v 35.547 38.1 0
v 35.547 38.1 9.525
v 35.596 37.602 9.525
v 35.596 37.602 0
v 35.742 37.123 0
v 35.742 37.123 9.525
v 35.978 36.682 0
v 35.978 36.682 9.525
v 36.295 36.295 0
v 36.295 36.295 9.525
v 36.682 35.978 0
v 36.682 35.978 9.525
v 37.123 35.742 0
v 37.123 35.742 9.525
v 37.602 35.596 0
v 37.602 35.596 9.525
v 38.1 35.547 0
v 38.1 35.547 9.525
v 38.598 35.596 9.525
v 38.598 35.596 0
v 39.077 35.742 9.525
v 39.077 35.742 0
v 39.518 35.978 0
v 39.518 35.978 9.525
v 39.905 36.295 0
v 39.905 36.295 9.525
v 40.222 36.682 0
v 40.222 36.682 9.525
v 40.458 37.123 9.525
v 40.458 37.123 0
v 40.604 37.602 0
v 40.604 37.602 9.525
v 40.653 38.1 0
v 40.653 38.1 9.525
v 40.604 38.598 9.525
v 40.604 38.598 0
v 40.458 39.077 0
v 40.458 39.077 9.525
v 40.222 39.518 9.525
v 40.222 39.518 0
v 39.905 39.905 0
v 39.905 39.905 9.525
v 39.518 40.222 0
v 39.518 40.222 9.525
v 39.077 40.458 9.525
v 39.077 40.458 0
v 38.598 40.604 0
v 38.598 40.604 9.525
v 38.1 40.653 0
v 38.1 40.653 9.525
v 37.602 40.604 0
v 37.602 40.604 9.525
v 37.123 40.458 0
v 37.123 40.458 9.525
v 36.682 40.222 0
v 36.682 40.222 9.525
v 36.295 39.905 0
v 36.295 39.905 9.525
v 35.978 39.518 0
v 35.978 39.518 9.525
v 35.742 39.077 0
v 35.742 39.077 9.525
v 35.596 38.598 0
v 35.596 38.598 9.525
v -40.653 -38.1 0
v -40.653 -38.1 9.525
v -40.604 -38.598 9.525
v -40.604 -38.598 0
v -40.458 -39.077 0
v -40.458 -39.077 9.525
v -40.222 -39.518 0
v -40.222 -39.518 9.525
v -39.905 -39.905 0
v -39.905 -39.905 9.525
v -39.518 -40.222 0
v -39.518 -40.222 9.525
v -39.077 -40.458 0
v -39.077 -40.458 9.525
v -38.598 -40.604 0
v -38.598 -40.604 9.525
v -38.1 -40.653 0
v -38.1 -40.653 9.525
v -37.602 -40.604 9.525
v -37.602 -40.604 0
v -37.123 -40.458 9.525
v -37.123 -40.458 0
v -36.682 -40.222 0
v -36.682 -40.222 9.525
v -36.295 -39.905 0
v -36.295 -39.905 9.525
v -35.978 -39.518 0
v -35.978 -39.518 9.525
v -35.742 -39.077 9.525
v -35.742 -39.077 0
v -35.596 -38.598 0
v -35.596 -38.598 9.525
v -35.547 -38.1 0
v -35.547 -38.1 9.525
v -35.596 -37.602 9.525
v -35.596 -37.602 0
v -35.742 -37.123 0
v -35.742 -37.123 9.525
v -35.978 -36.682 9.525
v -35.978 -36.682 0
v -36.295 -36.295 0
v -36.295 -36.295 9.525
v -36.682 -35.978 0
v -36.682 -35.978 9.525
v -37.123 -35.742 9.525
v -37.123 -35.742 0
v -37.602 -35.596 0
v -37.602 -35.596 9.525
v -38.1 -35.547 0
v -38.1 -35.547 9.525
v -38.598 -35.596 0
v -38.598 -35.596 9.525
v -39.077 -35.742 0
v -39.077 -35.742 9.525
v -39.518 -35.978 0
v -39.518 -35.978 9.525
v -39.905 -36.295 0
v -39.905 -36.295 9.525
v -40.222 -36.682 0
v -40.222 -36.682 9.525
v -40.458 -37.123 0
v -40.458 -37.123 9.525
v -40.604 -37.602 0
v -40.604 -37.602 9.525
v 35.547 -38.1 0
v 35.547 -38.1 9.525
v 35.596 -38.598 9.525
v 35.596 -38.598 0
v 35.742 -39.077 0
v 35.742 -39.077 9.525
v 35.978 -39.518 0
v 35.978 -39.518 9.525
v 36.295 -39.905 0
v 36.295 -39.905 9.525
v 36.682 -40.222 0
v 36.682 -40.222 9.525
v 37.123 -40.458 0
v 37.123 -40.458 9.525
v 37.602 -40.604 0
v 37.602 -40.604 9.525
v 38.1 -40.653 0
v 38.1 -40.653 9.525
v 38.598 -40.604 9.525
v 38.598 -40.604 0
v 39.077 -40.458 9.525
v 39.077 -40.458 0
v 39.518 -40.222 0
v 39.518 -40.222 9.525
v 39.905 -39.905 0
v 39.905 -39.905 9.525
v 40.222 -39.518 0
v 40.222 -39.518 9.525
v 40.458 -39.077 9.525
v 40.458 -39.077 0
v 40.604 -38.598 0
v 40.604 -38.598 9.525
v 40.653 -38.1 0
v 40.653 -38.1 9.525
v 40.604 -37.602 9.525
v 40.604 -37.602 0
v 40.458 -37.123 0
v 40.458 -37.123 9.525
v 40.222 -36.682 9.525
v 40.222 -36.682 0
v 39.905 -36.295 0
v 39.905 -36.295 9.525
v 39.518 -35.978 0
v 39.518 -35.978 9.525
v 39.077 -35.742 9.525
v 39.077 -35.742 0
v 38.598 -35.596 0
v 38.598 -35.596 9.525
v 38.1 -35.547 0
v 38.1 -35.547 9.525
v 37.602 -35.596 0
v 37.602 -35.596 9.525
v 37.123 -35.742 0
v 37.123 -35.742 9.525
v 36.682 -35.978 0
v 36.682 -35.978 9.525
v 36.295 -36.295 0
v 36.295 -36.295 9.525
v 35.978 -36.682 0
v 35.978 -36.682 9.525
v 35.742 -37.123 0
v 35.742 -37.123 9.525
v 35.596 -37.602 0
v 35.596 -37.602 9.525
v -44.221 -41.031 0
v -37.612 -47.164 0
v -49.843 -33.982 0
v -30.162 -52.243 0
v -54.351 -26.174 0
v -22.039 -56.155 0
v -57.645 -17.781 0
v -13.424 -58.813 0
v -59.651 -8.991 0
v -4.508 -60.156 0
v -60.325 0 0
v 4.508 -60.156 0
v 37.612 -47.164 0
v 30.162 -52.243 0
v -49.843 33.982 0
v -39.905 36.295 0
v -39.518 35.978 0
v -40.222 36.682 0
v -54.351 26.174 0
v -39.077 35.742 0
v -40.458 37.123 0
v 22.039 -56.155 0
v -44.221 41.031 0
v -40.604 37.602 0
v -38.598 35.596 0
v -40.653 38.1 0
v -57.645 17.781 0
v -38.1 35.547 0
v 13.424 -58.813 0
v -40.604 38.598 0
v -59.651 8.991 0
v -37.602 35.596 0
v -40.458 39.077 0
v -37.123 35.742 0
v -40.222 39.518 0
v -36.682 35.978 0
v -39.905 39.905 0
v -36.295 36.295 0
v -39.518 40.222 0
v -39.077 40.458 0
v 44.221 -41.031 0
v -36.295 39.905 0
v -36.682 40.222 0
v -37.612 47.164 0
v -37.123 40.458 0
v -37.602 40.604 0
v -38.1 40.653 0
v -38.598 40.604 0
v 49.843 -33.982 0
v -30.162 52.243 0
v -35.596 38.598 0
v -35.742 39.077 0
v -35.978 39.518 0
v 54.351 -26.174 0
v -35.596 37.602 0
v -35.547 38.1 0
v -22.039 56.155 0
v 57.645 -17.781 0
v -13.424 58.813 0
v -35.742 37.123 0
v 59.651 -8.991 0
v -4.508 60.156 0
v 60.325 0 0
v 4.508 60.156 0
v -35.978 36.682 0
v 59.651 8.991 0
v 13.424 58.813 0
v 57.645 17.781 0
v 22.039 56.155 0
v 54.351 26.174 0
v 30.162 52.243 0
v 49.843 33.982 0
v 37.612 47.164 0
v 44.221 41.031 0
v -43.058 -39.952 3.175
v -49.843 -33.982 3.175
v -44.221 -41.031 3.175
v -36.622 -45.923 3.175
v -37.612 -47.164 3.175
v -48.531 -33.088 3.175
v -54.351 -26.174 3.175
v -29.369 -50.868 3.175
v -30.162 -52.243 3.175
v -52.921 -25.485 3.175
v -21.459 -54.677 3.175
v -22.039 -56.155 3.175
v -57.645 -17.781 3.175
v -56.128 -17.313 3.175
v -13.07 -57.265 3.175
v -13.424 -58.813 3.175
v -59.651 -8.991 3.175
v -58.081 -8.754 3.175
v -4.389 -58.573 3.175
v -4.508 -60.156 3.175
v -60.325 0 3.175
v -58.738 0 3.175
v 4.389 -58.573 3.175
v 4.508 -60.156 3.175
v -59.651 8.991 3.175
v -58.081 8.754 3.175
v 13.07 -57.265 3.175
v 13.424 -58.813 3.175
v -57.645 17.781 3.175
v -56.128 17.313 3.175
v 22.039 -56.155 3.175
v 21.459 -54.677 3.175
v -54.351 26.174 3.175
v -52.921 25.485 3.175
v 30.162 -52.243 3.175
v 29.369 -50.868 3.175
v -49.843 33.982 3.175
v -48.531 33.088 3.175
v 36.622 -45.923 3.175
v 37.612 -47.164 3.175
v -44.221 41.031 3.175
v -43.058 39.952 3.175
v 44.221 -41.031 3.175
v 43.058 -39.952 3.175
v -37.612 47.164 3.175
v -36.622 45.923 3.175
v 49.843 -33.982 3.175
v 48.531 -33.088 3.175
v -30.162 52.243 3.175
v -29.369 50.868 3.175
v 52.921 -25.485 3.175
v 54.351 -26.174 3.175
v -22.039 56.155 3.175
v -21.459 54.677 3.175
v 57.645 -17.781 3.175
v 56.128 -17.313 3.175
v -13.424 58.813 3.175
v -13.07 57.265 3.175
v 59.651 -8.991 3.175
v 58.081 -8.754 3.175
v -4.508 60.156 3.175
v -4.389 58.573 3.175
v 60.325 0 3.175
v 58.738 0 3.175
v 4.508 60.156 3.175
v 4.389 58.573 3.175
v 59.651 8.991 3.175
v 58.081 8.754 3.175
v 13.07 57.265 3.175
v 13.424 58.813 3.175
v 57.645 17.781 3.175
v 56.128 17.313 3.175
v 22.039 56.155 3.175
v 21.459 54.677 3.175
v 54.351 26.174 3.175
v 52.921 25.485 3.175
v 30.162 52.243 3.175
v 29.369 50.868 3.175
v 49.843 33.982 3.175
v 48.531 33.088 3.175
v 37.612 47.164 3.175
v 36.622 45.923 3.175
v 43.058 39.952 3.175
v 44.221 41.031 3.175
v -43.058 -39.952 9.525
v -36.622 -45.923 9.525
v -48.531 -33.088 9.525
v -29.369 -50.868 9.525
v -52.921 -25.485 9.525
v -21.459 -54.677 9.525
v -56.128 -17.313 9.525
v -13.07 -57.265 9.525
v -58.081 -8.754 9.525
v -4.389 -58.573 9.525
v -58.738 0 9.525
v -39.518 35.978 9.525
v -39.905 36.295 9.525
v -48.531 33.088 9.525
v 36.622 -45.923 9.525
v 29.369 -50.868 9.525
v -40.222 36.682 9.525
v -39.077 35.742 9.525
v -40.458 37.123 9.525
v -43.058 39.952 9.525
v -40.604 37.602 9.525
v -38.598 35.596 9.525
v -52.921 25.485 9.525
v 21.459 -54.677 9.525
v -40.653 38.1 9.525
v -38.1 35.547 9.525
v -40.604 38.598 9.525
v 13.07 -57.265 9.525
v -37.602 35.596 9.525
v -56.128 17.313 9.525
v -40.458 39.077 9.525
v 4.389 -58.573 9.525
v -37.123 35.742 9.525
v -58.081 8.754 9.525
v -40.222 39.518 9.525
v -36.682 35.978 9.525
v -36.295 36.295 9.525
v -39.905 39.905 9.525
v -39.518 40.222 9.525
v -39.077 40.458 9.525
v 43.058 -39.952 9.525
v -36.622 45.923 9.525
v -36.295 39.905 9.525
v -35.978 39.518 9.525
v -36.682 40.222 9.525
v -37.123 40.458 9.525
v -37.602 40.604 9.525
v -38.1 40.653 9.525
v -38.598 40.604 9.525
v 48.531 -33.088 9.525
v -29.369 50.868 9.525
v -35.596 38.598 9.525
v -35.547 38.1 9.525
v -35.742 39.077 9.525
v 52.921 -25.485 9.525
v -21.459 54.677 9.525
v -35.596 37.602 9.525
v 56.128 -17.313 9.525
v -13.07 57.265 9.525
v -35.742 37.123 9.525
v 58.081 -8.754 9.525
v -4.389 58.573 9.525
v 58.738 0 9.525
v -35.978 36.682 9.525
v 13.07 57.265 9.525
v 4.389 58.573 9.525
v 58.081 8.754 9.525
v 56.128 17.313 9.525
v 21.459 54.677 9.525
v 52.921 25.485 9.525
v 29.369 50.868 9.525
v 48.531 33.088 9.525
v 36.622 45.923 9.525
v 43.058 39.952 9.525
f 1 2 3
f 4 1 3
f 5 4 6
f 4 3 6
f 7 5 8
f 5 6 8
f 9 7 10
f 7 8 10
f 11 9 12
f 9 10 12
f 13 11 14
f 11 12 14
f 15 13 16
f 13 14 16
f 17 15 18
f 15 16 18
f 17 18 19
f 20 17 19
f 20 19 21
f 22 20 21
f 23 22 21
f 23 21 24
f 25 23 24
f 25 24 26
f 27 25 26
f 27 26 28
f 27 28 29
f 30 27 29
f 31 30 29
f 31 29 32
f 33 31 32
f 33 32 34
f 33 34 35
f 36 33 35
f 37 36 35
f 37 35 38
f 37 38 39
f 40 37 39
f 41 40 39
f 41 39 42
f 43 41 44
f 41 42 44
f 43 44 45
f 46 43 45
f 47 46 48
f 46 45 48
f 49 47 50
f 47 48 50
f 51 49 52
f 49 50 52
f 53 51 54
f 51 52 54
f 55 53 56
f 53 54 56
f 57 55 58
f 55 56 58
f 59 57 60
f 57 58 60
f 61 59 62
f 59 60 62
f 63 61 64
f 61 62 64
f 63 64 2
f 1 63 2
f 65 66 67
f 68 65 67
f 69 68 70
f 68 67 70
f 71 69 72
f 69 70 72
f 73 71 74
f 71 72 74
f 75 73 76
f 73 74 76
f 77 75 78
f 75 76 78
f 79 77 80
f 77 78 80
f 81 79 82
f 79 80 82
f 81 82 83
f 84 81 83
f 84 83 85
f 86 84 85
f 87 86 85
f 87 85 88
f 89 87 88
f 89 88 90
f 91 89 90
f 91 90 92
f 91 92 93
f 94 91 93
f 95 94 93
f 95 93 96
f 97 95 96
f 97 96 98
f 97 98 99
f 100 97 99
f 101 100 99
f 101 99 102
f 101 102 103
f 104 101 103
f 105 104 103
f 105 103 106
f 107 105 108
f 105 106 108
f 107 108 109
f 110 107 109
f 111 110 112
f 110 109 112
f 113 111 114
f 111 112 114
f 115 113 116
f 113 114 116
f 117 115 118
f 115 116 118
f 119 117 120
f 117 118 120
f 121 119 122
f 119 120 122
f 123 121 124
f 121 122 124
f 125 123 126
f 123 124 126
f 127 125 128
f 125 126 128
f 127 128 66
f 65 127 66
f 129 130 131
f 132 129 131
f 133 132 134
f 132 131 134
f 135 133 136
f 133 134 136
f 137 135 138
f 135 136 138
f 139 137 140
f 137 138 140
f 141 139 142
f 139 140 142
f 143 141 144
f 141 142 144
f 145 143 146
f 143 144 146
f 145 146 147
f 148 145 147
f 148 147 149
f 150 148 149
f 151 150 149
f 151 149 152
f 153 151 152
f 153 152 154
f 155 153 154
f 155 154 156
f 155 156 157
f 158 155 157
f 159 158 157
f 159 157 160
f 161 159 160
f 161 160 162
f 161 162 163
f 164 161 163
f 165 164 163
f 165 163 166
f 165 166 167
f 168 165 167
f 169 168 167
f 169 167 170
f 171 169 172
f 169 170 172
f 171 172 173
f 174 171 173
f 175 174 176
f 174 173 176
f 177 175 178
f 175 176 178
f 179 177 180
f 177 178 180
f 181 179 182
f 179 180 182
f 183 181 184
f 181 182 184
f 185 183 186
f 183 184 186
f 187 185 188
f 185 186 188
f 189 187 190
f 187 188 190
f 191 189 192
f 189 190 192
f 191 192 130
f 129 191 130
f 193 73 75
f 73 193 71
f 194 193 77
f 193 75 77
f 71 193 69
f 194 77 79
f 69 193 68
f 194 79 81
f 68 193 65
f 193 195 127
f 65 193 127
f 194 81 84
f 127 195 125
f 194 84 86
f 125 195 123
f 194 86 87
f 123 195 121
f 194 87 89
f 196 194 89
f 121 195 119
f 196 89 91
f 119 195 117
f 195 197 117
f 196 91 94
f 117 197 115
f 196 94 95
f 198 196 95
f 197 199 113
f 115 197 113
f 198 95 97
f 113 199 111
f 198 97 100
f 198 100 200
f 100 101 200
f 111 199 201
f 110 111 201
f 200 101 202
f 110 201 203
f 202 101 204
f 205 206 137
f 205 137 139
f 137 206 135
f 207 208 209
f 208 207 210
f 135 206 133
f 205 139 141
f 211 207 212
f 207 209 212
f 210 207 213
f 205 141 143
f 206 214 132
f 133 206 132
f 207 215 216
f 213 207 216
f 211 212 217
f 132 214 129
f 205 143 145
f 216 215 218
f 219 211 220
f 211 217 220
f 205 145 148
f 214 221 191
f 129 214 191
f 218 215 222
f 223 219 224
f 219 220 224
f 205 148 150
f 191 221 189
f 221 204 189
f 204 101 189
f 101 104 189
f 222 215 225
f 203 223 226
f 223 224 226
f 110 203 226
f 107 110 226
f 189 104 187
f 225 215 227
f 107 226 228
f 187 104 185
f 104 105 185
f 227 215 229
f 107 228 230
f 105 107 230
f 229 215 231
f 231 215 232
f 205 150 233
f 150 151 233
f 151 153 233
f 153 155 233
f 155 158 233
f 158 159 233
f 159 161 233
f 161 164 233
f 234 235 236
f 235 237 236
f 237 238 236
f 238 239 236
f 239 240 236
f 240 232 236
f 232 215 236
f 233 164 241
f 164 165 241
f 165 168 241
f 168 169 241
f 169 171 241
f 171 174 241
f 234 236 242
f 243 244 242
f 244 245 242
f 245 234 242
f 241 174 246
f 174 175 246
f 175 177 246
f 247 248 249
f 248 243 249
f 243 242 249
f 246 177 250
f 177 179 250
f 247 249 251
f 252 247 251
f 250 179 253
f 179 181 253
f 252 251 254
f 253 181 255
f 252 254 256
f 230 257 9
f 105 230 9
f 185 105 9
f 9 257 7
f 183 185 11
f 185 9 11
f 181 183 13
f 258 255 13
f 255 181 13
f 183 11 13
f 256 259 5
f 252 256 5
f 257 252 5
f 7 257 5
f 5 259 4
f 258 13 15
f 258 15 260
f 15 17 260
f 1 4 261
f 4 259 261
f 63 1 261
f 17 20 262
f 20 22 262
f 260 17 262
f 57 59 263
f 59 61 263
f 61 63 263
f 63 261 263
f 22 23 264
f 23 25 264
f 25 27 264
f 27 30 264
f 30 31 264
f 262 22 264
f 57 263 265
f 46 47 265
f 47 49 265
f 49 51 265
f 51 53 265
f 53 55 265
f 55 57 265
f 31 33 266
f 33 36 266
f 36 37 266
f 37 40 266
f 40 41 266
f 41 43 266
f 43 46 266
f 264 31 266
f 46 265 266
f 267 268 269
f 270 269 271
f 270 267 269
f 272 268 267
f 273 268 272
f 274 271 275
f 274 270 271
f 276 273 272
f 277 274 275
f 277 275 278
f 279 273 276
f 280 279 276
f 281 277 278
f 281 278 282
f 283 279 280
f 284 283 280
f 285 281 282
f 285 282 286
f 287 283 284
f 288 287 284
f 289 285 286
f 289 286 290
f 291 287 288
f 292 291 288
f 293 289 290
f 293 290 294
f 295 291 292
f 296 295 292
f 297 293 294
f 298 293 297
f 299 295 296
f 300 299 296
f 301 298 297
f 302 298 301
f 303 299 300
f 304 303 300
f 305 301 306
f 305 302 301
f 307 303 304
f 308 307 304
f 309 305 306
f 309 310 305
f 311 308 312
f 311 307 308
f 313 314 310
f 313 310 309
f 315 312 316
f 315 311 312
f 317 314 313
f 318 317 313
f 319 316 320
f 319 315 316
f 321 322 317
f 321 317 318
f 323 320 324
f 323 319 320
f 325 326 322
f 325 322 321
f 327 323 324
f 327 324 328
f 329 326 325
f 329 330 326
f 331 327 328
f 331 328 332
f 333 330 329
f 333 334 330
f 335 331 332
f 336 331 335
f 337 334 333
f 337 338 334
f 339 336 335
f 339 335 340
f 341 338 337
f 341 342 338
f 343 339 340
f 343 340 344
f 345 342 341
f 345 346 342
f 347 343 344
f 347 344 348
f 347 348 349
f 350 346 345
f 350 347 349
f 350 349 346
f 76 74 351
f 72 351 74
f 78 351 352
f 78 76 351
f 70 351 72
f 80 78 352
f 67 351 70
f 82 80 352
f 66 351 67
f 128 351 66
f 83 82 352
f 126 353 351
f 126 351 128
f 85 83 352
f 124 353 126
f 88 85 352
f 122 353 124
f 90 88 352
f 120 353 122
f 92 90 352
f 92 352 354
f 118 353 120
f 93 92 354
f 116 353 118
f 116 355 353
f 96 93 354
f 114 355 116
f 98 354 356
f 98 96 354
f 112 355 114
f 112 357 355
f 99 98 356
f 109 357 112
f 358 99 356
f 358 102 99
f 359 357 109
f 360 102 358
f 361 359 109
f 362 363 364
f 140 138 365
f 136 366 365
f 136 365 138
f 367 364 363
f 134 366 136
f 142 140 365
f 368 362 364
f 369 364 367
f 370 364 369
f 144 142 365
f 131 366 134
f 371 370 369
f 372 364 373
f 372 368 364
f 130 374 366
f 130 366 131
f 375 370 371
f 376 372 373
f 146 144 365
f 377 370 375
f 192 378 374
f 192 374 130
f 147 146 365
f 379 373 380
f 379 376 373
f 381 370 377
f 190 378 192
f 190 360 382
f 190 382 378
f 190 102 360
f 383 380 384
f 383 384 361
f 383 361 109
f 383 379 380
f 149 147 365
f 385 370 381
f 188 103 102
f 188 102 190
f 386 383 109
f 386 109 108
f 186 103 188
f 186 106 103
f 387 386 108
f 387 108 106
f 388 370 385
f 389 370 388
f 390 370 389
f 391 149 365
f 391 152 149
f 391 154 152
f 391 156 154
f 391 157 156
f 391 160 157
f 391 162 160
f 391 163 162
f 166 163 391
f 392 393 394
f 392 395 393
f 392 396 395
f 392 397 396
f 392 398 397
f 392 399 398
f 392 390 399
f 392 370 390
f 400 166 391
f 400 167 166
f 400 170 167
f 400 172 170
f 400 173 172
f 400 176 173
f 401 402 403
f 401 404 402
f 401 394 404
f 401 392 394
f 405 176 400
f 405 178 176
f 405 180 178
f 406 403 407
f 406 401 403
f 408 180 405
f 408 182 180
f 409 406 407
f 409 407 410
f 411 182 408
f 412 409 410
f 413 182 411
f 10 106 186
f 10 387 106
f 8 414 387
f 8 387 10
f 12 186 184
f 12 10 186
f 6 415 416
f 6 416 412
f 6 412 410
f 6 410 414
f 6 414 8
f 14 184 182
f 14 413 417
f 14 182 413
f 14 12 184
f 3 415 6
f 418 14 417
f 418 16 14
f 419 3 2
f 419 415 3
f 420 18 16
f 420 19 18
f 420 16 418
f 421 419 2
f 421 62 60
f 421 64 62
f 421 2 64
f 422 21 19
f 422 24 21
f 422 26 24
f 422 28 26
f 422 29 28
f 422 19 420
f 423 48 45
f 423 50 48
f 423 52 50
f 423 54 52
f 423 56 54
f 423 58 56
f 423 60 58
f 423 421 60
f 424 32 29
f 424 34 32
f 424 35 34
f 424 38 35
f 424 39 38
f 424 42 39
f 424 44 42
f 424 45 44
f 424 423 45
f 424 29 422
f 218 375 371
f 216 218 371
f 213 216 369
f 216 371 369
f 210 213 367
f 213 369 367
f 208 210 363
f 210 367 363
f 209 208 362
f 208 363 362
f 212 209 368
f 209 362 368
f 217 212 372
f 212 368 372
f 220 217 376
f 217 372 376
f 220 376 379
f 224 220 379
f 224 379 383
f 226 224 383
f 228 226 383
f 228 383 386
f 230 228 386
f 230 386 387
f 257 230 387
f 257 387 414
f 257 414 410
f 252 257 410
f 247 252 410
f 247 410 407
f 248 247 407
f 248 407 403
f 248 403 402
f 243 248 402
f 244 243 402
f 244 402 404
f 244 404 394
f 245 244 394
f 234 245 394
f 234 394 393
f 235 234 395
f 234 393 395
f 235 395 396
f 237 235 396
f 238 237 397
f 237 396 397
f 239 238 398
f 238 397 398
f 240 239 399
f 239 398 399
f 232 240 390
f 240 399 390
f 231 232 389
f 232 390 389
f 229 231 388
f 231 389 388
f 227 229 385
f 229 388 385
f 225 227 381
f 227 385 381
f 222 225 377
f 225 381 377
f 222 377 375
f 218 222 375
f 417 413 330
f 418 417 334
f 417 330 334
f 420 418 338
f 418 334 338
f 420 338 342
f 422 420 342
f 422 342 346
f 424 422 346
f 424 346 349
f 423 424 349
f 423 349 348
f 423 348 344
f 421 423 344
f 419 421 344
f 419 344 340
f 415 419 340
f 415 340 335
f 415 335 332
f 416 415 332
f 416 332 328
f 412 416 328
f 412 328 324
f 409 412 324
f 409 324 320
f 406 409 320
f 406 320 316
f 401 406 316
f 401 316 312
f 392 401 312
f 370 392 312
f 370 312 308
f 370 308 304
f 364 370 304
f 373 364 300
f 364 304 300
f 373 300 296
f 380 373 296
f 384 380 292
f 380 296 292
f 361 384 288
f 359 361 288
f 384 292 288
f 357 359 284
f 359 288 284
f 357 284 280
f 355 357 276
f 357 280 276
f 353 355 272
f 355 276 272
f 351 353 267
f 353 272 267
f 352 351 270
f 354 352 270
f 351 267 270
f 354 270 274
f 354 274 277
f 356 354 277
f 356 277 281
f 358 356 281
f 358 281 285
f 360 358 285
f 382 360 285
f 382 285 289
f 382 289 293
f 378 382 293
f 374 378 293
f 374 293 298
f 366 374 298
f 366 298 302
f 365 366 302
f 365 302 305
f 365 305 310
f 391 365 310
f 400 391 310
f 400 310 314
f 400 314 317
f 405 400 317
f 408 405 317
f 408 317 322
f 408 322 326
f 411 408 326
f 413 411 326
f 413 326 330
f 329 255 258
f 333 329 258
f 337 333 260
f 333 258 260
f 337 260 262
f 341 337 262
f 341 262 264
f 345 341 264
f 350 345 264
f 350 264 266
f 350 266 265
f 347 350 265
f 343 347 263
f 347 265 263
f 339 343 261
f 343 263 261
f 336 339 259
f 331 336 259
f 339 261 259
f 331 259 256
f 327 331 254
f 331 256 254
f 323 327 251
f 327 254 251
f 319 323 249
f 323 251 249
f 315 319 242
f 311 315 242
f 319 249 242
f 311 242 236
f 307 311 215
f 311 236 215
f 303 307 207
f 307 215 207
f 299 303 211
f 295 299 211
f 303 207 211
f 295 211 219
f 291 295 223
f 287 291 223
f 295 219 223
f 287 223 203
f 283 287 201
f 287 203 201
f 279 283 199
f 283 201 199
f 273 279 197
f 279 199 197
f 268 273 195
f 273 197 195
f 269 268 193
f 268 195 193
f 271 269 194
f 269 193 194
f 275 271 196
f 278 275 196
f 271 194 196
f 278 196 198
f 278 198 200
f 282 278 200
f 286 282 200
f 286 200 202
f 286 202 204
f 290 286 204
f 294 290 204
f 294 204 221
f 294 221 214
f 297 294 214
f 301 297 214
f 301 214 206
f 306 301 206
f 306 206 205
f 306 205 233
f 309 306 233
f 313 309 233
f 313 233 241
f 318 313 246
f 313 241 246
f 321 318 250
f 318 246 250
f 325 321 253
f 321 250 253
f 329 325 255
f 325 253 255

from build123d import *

# Parameters (mm, degrees)
F0_R     = 60.325
F0_R_2   = 58.7375
F1_DEPTH = 3.175
F2_DEPTH = 9.525
F3_D     = 5.1054
F3_DEPTH = 76.2
F3_TIP   = 1.5338169022


# Not quite as in the source:
# - a feature names something its author has since deleted; it is built from what else it names


with BuildPart() as f1:
    # F0 (on Top) → F1 (new body)
    with BuildSketch(Plane.XY):
        Circle(F0_R)
        Circle(F0_R_2, mode=Mode.SUBTRACT)
        Circle(F0_R_2)
    extrude(amount=F1_DEPTH)

    # F0 (on Top) → F2 (join)
    with BuildSketch(Plane.XY):
        Circle(F0_R_2)
    extrude(amount=F2_DEPTH)

    # F3
    with Locations(Plane(origin=(0, 0, 0), x_dir=(1, 0, 0), z_dir=(0, 0, -1))):
        with Locations((38.1, -38.1), (-38.1, -38.1), (-38.1, 38.1), (38.1, 38.1)):
            Hole(F3_D / 2, depth=F3_DEPTH)
            with Locations((0, 0, -(F3_DEPTH + F3_TIP / 2))):  # 118° drill point
                Cone(0, F3_D / 2, F3_TIP, mode=Mode.SUBTRACT)


solid = f1.part
